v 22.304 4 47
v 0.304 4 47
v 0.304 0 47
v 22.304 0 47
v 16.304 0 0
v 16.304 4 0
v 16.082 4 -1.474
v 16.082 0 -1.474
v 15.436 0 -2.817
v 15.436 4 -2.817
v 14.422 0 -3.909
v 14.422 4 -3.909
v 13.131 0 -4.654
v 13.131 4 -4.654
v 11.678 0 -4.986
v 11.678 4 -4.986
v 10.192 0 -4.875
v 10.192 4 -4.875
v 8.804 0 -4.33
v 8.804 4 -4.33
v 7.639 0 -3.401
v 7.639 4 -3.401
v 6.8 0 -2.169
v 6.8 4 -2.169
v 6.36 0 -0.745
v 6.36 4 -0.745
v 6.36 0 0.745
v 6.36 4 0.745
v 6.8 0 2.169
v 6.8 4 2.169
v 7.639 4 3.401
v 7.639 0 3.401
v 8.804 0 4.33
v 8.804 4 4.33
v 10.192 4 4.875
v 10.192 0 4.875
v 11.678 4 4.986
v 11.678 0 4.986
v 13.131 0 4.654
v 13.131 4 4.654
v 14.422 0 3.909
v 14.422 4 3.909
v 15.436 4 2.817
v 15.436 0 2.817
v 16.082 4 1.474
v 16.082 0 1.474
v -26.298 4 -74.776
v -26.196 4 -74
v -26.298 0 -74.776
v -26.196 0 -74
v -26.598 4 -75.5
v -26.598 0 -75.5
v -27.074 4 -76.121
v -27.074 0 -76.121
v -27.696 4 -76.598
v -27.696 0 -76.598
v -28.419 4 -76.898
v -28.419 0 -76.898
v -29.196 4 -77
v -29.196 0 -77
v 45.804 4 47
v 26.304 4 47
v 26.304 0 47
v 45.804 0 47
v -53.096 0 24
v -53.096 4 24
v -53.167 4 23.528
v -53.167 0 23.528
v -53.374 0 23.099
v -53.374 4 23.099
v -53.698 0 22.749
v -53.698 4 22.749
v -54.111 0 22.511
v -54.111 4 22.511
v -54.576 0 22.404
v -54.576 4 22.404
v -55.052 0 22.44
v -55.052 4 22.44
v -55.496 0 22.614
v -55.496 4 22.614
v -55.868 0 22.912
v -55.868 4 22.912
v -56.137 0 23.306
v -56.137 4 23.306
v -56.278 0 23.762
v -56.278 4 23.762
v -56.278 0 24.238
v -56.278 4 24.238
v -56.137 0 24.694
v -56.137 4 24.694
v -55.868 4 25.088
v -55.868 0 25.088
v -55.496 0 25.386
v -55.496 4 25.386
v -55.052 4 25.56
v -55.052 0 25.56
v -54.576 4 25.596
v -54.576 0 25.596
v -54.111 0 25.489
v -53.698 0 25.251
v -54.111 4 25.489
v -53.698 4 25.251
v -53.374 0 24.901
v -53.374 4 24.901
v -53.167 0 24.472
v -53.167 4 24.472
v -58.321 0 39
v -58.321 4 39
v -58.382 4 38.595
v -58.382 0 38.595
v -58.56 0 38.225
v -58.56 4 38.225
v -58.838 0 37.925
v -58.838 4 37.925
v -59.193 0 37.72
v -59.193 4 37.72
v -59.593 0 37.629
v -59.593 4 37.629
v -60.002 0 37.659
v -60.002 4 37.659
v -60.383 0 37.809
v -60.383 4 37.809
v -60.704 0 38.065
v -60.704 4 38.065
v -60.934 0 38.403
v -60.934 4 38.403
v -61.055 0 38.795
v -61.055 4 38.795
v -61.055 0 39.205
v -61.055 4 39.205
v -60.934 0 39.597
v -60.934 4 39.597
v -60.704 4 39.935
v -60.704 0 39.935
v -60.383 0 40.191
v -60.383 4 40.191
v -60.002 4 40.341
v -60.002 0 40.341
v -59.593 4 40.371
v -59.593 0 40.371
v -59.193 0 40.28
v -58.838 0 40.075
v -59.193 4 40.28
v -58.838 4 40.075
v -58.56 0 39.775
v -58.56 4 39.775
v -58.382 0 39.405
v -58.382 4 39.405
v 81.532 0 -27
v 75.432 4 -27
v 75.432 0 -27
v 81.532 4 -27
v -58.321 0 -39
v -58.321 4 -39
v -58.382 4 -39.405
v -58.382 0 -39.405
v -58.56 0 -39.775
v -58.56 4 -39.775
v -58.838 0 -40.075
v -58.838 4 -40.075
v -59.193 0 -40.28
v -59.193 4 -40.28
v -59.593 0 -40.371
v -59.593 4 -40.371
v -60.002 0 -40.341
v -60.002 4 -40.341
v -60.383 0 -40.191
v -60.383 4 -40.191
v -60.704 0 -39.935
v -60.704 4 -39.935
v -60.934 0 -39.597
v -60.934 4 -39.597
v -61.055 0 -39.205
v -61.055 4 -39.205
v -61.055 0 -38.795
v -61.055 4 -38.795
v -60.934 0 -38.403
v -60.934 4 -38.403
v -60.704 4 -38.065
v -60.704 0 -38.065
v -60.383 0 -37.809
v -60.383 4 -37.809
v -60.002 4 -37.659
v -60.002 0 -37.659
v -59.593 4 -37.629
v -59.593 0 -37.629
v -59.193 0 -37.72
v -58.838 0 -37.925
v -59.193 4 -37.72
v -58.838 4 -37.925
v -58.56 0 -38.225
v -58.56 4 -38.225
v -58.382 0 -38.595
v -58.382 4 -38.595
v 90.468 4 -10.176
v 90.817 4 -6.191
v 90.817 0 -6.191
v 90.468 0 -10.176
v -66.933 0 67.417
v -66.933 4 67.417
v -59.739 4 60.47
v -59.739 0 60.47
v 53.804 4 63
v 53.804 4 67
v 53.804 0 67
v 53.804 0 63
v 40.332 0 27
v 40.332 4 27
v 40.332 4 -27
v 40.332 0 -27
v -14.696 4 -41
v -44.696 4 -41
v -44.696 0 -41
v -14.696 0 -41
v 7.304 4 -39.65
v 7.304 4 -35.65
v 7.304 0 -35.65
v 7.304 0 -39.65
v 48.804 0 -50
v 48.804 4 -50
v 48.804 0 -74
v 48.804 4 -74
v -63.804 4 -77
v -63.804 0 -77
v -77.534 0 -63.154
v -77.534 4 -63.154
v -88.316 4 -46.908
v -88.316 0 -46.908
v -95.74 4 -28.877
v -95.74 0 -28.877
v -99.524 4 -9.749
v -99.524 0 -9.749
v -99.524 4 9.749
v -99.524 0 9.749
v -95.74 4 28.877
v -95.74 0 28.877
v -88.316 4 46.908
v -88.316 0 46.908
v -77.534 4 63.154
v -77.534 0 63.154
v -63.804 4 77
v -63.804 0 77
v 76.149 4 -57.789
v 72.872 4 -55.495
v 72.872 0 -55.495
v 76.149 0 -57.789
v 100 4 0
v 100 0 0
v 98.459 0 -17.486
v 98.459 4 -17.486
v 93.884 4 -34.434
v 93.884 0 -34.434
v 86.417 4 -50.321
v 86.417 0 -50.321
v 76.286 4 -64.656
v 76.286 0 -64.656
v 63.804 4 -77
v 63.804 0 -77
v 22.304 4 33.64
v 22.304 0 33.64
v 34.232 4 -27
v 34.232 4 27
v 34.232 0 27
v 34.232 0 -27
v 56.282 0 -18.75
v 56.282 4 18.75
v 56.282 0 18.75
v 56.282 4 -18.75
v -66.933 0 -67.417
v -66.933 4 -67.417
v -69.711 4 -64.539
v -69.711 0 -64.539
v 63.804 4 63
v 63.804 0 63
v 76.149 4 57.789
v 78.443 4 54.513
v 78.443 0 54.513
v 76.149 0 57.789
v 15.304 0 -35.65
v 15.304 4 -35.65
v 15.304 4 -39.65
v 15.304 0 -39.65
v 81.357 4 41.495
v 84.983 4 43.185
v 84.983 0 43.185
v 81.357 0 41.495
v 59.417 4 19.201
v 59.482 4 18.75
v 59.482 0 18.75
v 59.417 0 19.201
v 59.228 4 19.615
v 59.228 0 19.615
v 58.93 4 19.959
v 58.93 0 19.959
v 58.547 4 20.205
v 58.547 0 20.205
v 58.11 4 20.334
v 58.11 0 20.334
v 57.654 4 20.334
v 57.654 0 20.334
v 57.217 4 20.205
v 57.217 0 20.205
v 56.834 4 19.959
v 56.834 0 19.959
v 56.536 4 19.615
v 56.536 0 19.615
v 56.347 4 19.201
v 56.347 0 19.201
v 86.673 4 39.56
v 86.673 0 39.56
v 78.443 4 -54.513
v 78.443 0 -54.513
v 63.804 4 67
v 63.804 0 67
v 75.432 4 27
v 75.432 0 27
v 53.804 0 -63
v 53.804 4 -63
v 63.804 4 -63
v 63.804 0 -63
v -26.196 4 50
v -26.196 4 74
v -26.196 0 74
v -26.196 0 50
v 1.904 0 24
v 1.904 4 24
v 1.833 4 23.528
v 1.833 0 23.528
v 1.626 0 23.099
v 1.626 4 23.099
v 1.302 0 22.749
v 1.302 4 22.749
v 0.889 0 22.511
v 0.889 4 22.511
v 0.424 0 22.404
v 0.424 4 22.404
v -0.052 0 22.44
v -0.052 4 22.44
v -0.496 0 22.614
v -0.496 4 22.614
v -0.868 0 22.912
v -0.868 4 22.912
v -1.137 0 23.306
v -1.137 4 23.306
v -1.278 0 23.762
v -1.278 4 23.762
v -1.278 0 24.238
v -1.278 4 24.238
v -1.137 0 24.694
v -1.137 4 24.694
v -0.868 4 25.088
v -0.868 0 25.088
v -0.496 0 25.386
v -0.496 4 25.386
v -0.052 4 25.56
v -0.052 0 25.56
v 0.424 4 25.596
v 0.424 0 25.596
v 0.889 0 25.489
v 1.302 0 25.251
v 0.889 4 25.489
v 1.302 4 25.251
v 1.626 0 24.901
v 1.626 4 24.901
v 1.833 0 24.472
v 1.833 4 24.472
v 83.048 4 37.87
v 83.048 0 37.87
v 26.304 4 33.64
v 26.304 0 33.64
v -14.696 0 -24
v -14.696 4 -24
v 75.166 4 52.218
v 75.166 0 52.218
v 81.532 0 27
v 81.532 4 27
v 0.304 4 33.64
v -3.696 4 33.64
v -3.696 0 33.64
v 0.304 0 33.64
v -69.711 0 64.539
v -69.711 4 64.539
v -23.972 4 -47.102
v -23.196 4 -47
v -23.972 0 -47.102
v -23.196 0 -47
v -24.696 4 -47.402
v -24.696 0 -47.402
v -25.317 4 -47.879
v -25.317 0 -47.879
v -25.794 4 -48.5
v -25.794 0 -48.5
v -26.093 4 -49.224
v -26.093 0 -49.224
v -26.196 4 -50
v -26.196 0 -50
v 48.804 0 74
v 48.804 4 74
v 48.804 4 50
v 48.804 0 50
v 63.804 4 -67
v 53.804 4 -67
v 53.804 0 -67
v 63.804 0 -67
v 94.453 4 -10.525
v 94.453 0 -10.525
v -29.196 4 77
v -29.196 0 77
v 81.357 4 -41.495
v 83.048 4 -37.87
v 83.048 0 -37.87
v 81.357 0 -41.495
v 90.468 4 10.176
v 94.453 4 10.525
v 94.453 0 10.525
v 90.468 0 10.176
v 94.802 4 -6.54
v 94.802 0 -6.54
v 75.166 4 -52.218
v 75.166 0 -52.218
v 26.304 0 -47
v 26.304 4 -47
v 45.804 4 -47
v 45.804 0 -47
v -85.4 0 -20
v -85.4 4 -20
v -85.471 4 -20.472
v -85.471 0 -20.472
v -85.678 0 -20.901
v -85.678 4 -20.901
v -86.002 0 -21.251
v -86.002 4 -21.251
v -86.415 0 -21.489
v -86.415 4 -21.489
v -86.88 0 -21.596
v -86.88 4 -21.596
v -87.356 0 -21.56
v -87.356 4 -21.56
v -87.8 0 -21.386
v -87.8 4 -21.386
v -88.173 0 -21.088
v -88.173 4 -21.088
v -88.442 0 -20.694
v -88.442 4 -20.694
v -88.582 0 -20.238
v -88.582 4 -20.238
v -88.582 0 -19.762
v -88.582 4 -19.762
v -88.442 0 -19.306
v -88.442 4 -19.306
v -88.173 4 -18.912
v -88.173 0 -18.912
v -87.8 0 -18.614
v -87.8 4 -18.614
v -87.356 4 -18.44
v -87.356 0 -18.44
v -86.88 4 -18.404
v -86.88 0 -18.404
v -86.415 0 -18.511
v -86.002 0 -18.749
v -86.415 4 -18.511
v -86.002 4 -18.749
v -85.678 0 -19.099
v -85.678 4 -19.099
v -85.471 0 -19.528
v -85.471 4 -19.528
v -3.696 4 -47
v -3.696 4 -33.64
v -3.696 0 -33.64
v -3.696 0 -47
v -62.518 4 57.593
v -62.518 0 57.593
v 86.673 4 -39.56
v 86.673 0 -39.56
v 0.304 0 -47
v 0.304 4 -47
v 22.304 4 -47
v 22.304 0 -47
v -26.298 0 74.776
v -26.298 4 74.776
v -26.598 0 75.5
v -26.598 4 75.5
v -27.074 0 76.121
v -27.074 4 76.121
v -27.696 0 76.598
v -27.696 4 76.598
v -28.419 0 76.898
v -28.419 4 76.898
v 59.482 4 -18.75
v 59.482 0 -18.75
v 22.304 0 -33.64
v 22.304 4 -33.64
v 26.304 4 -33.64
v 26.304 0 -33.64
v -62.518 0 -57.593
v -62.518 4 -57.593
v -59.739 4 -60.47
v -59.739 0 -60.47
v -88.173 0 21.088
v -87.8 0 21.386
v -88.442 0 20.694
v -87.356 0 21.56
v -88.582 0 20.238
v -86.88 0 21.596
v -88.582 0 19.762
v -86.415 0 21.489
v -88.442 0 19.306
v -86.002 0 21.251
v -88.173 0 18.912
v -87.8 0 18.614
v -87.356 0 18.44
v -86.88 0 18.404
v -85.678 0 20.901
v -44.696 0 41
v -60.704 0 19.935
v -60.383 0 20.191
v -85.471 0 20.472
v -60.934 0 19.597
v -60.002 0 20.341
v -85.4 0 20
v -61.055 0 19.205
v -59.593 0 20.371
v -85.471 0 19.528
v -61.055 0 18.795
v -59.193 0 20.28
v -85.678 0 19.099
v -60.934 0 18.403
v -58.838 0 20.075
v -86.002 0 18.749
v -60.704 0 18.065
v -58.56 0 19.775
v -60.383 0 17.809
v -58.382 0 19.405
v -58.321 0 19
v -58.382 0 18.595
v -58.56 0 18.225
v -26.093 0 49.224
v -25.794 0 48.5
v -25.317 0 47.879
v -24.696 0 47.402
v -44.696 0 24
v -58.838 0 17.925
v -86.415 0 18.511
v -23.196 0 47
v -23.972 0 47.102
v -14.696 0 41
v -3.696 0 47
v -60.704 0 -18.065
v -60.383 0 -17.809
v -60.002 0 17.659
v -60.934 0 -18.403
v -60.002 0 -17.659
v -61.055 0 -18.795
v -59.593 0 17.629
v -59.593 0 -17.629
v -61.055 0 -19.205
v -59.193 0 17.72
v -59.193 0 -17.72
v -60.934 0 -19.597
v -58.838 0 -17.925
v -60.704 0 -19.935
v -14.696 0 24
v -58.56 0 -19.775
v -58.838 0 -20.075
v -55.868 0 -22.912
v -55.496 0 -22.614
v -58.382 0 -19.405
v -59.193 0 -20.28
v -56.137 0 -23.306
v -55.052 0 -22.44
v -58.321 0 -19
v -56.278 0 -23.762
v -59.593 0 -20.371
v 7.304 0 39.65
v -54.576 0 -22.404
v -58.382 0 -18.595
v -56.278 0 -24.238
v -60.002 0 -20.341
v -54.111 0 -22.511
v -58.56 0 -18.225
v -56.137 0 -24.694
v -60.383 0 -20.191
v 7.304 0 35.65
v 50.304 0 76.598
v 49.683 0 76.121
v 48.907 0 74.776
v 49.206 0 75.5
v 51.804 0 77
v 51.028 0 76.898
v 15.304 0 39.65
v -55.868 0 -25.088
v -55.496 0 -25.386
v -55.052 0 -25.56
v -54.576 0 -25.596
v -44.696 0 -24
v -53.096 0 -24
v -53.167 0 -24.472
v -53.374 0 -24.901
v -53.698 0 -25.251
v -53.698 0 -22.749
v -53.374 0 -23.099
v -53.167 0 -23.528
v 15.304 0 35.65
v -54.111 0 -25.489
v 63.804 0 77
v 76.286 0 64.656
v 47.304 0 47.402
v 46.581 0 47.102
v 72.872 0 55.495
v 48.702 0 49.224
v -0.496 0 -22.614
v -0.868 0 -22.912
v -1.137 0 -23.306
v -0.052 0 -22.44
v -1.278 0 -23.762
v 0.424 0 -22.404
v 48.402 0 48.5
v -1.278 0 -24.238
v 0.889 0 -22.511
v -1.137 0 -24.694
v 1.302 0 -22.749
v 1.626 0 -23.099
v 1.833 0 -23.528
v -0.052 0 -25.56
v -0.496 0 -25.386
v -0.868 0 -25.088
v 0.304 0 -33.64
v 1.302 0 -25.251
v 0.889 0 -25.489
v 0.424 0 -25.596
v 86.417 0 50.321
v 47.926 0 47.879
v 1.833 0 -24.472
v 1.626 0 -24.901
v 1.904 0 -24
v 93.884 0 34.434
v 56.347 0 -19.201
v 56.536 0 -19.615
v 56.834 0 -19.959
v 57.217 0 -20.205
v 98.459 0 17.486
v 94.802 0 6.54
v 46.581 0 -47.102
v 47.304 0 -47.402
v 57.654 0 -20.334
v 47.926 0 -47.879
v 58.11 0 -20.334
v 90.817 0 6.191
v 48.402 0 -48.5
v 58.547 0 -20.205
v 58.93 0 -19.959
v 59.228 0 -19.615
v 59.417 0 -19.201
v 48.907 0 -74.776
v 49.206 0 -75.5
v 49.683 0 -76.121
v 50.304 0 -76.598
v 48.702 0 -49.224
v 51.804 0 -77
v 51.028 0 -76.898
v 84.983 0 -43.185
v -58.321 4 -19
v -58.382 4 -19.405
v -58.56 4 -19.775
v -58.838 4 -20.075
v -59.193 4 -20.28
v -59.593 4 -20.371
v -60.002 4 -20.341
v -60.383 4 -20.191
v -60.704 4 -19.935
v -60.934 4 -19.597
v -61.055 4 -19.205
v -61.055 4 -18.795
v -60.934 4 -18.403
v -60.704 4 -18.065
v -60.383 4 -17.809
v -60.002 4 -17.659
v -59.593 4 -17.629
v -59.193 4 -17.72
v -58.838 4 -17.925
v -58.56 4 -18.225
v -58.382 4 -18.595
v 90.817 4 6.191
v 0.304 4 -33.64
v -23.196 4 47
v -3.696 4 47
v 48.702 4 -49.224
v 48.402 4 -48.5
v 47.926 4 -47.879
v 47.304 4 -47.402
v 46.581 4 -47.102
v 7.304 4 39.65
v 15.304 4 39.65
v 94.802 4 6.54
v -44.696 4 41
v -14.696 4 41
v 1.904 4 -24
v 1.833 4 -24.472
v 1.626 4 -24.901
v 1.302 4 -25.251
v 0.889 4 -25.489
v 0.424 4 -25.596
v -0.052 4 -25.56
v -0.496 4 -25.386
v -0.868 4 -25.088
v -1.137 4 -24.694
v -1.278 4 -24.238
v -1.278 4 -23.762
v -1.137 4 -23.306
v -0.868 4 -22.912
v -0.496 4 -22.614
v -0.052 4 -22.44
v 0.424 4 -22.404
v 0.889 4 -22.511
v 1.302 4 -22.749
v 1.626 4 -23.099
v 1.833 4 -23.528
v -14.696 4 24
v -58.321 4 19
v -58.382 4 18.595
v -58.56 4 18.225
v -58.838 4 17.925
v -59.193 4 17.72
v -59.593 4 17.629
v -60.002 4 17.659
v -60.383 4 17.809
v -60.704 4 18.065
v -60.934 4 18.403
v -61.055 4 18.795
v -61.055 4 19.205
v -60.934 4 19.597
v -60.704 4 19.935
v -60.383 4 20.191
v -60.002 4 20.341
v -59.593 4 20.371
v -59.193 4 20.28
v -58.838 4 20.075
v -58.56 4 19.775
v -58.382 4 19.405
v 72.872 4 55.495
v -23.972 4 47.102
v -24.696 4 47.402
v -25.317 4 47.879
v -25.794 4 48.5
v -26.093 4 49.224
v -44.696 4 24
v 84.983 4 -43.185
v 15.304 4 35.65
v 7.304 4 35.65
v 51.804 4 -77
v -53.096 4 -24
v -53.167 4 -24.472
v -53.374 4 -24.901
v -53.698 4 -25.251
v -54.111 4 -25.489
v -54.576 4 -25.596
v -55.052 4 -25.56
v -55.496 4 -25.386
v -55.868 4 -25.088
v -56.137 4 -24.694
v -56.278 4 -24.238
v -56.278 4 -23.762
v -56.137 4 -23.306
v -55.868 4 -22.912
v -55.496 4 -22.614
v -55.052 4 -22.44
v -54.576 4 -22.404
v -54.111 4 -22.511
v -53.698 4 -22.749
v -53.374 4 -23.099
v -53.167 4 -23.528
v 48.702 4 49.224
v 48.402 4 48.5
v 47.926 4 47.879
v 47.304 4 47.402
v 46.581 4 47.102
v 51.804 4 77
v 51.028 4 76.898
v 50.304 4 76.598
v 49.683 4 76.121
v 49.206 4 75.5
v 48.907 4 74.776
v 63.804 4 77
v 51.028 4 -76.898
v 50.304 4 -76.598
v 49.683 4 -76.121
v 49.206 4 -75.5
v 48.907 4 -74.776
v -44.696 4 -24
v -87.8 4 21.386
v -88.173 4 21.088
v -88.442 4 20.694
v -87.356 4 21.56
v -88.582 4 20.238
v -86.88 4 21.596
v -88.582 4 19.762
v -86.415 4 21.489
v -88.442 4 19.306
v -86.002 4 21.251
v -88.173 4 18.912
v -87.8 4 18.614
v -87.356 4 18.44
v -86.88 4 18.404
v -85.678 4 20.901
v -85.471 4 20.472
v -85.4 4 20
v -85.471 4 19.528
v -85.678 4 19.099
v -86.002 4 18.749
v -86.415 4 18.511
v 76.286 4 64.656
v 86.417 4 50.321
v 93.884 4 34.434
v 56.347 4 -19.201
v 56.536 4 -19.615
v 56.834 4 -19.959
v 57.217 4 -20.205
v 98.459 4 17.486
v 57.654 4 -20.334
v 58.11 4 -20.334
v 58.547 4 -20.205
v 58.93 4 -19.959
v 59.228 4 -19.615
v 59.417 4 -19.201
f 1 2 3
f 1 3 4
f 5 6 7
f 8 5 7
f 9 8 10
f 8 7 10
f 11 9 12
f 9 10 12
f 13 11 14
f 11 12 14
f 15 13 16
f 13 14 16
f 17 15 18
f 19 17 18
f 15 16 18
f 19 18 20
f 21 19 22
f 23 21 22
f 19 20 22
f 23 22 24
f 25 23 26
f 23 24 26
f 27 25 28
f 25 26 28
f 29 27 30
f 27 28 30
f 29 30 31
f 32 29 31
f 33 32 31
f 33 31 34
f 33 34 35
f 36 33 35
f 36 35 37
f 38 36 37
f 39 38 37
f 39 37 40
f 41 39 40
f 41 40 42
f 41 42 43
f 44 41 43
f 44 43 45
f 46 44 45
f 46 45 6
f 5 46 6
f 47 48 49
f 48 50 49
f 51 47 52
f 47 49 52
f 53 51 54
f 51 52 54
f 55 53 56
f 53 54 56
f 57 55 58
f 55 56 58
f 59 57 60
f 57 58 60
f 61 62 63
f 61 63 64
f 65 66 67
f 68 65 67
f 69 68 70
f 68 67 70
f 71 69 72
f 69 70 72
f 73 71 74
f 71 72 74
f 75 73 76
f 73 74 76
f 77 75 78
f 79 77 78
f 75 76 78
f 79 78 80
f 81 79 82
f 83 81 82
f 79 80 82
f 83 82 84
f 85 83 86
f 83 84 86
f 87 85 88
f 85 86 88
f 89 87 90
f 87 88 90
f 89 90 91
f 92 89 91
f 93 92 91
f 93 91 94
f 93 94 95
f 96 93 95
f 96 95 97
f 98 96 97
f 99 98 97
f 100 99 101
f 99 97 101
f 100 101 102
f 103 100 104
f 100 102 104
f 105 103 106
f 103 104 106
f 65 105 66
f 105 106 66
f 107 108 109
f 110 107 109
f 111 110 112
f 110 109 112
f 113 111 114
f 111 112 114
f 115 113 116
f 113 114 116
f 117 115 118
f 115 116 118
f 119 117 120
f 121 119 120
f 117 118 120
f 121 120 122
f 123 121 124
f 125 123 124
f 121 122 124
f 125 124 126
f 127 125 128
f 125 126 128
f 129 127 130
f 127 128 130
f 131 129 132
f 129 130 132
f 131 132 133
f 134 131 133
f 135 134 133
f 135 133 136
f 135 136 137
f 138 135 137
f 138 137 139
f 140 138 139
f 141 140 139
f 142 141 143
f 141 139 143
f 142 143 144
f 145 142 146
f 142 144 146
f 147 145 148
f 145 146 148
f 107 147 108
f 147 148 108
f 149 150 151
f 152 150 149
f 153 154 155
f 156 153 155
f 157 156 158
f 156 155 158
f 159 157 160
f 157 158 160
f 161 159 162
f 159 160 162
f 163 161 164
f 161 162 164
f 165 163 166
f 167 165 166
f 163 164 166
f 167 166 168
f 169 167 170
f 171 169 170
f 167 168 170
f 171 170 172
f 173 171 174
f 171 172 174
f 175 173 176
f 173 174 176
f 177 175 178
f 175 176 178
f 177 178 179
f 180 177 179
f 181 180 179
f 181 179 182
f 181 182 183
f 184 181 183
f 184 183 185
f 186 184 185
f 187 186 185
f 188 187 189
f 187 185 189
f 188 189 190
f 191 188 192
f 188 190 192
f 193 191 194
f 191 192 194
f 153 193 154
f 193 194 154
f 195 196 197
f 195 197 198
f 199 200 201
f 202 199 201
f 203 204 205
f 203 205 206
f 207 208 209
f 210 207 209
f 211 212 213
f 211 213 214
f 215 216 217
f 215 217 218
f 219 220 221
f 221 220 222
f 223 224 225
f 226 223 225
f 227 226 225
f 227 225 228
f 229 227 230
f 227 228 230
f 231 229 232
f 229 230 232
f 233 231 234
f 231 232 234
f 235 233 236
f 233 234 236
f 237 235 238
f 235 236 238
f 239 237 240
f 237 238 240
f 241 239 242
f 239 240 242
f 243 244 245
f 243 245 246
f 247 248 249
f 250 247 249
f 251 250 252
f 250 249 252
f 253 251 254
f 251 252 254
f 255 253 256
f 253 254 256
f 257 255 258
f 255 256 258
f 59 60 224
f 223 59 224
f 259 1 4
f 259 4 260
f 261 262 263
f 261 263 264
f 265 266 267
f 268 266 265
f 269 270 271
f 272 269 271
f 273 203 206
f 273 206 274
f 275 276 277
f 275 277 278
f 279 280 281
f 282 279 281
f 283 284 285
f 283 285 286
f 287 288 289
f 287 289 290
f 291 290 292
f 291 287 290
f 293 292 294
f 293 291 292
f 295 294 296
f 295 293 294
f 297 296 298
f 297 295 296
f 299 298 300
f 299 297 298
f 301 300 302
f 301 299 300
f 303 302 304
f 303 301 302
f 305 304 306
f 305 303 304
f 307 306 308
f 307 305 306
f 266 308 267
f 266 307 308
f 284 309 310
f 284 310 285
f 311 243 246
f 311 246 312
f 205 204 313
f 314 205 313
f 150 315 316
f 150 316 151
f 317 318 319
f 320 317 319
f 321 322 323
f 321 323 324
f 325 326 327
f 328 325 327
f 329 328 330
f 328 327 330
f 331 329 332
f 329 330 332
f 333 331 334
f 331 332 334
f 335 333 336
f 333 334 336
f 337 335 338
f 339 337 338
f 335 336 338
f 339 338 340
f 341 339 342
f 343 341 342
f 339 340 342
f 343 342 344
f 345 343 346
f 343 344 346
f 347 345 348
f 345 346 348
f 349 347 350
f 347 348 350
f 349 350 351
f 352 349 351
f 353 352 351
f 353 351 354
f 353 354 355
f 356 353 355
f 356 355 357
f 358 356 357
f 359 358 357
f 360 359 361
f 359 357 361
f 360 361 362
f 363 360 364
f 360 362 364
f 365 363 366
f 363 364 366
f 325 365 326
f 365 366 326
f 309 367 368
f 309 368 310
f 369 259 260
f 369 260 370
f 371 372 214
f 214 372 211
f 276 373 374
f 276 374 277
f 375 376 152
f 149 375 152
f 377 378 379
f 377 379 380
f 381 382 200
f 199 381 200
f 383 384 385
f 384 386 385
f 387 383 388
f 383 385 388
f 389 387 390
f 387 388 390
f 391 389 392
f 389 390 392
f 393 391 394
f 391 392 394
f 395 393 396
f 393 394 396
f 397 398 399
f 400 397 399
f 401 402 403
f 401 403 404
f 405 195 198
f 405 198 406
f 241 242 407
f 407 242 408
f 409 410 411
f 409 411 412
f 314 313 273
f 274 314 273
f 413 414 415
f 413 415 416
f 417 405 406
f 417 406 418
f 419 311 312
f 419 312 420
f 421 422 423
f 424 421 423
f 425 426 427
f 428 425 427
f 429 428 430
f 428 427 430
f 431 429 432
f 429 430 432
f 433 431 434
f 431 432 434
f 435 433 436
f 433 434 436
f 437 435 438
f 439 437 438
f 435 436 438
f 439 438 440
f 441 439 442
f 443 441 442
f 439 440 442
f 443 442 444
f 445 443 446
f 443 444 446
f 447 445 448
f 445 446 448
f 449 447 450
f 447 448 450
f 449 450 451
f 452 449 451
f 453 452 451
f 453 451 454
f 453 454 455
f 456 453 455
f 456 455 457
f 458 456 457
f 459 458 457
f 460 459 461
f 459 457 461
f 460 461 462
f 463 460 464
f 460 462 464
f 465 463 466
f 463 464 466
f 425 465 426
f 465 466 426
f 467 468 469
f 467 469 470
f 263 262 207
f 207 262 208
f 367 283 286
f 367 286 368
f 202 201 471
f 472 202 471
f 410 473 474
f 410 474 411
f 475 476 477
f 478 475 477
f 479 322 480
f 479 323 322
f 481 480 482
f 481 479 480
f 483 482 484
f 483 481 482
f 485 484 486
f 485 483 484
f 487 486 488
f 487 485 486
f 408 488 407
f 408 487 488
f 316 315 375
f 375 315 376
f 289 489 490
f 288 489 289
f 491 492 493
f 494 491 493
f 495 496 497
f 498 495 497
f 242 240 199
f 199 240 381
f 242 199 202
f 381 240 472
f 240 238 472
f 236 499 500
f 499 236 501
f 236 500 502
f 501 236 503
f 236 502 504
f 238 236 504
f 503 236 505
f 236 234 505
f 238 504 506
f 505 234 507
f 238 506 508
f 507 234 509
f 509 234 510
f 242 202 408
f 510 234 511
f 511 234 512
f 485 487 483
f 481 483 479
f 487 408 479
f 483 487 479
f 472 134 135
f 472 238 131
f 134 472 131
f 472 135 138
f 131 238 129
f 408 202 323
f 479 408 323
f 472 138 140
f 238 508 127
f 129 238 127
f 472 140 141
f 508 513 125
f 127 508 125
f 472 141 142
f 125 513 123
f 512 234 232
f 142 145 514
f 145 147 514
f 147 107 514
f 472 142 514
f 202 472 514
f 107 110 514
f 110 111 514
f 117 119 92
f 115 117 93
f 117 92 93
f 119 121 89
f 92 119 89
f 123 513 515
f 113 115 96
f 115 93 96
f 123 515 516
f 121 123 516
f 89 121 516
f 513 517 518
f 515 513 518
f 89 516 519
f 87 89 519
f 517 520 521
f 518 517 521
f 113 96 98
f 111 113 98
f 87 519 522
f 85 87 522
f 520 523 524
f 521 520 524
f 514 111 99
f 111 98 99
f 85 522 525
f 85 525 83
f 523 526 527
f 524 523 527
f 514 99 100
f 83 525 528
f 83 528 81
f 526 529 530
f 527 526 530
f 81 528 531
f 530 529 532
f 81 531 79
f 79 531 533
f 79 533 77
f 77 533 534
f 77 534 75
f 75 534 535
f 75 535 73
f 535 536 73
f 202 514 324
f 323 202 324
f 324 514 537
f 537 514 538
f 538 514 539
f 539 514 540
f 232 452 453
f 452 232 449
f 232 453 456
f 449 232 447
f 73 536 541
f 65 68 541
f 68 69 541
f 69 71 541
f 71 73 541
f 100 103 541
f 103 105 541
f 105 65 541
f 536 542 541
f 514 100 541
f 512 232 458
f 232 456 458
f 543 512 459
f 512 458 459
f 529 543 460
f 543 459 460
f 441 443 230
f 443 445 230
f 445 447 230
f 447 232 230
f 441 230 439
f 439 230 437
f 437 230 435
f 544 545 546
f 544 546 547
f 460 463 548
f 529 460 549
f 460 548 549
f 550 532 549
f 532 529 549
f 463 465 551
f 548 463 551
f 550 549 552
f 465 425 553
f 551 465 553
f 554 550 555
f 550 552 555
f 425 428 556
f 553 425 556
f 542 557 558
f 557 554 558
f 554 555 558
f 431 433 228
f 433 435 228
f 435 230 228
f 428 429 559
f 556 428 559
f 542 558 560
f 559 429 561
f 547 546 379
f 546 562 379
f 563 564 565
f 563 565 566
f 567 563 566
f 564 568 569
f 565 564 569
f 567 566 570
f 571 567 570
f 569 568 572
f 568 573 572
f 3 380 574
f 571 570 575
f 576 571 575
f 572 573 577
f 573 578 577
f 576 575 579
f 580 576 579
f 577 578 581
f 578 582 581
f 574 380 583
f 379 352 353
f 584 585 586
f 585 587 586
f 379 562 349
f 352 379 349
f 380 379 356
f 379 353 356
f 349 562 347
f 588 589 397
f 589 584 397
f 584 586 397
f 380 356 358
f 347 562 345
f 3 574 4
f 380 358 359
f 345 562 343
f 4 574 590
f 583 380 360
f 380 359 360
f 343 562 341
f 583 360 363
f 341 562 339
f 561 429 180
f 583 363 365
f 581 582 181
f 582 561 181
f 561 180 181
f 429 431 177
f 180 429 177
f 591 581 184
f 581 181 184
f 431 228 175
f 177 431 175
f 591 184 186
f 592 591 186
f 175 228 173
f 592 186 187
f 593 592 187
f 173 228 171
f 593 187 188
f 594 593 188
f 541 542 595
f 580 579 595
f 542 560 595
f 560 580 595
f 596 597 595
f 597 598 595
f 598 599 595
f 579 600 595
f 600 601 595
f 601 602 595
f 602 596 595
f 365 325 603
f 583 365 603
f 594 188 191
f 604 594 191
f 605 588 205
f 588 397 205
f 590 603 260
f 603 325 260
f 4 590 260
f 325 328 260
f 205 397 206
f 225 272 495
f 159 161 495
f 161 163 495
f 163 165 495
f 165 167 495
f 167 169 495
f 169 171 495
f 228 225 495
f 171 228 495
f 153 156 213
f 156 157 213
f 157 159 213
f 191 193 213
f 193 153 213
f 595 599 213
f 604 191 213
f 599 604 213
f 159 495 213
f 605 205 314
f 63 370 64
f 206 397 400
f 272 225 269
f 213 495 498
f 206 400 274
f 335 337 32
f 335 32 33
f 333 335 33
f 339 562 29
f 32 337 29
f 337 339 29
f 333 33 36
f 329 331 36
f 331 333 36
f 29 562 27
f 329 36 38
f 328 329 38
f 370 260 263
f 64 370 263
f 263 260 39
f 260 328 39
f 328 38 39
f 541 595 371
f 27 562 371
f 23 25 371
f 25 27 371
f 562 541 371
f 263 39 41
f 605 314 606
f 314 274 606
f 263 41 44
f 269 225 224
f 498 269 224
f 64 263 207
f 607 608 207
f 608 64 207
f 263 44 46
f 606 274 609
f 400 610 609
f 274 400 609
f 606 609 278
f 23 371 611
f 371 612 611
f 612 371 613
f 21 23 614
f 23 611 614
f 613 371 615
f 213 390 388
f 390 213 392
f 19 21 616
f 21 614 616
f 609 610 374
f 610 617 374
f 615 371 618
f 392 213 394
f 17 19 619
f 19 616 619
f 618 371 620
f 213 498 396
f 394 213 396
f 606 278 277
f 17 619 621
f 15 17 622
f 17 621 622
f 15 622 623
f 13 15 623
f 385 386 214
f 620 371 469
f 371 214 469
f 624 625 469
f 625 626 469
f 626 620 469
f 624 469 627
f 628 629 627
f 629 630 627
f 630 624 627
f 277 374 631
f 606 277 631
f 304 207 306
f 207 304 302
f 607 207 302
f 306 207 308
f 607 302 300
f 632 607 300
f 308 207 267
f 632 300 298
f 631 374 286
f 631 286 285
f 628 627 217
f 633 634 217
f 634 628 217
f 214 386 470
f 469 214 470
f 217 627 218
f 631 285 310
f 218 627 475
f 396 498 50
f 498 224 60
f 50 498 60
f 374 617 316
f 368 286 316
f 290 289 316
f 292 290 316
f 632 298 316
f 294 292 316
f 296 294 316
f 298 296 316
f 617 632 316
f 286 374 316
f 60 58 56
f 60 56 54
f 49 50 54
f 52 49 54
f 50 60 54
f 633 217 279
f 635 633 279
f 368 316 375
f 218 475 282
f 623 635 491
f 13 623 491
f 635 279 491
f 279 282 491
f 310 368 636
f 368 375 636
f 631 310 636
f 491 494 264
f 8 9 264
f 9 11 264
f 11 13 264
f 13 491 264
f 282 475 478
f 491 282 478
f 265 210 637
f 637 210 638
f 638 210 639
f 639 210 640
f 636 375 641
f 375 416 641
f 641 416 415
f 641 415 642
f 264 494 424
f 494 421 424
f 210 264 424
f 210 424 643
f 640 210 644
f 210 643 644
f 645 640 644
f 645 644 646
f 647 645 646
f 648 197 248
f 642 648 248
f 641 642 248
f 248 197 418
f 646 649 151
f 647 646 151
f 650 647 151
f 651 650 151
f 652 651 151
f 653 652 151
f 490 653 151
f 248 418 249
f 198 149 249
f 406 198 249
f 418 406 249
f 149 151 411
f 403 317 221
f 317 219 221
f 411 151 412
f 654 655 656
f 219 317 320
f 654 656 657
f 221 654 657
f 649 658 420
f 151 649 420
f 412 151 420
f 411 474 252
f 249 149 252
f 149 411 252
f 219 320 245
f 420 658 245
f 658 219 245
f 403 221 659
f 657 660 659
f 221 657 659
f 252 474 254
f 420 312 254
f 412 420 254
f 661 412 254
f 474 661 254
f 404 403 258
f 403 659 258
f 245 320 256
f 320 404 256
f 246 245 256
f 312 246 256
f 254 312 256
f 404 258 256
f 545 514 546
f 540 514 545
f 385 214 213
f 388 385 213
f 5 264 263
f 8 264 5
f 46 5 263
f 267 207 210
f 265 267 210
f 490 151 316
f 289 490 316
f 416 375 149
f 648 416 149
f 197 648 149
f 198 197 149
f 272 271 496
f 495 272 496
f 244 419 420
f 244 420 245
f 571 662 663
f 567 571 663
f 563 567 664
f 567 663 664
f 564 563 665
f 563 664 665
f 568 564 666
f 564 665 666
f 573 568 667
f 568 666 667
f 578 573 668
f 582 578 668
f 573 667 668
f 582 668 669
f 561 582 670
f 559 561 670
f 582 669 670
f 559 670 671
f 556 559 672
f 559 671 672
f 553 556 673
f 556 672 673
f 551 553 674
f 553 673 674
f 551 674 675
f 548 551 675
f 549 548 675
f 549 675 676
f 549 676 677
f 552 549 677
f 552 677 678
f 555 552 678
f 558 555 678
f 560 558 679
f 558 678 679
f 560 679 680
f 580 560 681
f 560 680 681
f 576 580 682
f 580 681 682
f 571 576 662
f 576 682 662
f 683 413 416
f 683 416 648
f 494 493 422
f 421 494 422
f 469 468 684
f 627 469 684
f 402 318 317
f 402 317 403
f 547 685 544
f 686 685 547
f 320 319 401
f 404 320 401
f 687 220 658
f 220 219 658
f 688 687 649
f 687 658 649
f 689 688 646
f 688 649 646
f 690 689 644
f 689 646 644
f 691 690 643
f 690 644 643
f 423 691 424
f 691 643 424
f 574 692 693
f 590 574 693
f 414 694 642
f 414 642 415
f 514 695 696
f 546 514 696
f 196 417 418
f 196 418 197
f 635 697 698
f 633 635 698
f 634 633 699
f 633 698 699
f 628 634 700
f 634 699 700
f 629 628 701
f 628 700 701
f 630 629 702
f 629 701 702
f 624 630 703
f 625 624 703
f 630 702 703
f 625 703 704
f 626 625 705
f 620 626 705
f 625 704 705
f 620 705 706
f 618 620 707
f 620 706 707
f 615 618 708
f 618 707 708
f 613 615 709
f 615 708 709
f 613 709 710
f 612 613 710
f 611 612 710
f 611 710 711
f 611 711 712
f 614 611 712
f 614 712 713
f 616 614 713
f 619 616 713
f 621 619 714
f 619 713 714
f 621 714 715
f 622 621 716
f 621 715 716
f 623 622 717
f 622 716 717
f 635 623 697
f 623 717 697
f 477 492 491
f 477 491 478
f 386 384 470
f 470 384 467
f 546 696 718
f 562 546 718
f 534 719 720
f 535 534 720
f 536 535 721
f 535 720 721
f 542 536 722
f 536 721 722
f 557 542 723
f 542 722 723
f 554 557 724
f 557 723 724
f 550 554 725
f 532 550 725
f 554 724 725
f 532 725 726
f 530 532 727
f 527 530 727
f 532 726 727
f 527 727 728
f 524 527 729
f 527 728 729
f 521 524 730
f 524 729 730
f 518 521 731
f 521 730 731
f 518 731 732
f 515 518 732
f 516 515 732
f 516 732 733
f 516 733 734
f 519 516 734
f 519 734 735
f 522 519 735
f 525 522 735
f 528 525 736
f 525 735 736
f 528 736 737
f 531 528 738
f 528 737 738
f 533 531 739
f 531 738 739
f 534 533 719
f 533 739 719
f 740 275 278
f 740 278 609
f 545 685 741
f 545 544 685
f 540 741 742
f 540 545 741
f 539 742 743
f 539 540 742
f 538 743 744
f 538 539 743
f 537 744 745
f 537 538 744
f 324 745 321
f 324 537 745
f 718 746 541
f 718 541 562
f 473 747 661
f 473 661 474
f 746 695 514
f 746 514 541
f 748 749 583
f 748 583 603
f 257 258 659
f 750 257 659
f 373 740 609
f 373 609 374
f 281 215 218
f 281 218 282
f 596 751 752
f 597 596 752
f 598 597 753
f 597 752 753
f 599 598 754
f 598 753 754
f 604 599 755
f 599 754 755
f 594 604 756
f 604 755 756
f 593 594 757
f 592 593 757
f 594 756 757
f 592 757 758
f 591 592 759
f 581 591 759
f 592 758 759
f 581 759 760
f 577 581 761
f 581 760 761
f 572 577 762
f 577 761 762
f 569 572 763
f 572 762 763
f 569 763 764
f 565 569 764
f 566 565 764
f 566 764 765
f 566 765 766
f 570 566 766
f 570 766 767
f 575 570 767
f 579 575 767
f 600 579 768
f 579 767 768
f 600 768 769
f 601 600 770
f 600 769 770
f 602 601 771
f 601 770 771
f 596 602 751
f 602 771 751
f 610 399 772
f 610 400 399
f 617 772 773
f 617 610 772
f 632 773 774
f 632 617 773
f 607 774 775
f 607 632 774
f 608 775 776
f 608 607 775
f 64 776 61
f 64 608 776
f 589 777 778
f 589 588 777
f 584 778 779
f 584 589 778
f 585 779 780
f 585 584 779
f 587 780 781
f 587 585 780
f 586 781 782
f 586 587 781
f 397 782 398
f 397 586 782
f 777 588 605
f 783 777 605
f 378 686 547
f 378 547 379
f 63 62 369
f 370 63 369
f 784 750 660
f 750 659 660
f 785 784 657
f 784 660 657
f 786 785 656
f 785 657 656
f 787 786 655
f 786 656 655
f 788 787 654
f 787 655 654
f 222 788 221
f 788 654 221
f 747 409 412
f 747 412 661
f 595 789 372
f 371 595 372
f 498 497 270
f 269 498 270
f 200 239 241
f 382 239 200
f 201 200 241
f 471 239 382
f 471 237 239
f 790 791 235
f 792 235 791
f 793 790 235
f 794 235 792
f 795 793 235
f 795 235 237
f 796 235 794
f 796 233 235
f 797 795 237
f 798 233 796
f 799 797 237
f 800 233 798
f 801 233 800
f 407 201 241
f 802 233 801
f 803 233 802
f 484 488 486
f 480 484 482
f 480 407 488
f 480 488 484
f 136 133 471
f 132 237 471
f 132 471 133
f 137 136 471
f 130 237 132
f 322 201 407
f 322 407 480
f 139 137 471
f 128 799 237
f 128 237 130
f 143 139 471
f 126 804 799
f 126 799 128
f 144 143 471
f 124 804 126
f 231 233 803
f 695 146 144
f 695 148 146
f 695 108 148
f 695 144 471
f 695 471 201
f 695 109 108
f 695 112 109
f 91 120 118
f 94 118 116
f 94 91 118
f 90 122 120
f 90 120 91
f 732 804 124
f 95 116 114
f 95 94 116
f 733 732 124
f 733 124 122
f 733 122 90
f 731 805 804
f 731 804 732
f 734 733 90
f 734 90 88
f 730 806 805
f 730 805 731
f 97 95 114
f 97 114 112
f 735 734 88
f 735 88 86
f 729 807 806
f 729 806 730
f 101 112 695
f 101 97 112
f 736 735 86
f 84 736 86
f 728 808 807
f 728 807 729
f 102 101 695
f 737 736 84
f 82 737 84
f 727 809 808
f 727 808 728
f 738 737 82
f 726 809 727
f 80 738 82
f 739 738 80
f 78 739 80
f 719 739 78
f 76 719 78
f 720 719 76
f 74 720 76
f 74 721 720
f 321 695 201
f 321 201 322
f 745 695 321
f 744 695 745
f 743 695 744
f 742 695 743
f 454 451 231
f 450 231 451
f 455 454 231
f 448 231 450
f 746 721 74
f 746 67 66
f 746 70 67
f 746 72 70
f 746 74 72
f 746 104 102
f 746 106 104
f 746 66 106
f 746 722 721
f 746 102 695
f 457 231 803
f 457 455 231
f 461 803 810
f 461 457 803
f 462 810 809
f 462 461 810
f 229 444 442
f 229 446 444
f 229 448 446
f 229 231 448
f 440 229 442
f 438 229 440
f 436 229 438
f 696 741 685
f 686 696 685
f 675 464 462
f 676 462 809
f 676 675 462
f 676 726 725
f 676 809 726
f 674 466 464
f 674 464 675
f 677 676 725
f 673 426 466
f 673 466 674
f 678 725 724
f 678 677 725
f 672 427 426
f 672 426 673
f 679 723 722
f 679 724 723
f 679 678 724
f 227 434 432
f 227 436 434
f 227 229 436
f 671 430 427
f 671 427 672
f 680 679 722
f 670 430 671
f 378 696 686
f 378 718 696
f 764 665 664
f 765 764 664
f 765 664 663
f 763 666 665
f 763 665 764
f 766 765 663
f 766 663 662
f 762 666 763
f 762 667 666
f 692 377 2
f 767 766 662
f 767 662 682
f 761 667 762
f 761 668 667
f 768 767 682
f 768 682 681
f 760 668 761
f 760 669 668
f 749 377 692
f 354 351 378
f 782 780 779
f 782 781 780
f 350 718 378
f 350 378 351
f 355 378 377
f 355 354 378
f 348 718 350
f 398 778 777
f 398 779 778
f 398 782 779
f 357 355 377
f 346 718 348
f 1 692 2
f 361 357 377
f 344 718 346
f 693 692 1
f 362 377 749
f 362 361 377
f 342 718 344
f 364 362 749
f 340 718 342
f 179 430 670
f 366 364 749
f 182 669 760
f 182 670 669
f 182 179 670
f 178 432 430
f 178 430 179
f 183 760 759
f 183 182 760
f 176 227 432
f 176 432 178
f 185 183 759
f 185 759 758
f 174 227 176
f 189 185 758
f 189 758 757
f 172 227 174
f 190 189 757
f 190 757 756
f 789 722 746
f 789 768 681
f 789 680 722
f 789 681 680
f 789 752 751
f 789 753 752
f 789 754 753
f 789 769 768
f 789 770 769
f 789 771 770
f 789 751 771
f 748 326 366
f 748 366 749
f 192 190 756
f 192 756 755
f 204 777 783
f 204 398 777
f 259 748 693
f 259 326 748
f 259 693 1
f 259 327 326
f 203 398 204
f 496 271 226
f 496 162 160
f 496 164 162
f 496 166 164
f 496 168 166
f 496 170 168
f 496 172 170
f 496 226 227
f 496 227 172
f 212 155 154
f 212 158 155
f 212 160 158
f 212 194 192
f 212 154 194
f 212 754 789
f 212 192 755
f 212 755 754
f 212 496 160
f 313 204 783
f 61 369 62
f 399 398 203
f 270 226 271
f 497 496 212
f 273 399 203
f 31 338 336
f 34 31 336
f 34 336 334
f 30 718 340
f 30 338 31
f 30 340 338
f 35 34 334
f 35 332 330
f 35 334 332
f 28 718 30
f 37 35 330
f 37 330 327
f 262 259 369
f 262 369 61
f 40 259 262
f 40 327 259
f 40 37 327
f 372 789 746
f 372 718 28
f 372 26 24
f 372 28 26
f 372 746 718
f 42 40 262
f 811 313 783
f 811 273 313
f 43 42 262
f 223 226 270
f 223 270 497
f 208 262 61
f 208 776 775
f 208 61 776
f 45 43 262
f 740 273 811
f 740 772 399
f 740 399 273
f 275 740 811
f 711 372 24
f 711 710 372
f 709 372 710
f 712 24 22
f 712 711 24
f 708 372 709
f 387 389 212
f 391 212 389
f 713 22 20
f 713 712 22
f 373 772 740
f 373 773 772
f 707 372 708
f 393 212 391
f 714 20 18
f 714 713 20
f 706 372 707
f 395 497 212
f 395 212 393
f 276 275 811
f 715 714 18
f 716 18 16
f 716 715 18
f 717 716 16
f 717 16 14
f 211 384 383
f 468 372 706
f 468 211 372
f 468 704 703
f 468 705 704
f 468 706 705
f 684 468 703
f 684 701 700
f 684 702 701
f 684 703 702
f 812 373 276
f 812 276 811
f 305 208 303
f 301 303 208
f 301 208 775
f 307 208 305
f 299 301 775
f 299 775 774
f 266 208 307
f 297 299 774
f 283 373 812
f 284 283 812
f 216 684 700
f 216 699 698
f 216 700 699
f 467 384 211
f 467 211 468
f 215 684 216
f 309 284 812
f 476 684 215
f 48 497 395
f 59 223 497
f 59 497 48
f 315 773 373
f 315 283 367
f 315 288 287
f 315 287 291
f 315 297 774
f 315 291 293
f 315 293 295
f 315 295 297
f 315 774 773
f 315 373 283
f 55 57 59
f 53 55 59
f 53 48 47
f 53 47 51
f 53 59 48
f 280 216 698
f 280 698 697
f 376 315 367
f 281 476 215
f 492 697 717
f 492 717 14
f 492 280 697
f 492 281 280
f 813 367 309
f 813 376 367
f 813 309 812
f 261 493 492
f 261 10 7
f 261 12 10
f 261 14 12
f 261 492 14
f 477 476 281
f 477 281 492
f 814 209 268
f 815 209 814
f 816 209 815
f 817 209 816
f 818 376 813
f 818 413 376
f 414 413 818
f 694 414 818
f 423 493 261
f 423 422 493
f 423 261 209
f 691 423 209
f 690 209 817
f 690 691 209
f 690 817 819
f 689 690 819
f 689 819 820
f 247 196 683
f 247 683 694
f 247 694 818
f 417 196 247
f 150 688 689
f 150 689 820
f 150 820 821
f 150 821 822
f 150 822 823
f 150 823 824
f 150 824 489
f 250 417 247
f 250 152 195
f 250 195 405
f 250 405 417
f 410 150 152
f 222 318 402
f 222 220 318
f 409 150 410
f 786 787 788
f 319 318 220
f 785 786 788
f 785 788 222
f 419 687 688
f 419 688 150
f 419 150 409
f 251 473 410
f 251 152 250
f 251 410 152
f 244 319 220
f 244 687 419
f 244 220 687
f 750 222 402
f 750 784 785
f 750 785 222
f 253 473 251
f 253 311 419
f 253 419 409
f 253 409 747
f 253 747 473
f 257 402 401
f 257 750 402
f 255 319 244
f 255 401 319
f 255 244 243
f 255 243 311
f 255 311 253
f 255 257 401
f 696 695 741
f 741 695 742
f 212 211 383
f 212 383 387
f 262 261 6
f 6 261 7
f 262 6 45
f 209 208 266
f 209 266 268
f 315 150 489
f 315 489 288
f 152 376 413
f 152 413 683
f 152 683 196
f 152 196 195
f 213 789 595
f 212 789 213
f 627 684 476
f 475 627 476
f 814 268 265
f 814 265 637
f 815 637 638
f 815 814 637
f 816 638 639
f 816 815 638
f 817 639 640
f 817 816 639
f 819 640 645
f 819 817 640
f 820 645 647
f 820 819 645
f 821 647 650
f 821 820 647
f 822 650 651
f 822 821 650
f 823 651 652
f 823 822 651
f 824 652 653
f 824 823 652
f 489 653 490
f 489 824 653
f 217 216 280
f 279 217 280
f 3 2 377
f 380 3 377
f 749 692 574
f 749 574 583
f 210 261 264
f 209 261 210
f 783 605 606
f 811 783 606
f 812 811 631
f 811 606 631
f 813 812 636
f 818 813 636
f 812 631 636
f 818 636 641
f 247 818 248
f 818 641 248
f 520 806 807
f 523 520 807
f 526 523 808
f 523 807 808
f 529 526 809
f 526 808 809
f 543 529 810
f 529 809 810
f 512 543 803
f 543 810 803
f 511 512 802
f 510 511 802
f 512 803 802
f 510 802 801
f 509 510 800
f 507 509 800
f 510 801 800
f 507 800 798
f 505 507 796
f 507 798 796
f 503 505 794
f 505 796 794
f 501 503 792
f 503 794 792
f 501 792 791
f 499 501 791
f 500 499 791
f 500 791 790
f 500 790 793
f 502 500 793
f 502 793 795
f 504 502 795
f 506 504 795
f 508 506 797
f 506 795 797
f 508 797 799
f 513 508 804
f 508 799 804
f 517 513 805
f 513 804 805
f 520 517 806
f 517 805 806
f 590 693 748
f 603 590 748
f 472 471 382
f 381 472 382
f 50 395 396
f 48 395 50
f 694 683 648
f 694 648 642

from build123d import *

# Parameters (mm, degrees)
BASIS_DEPTH        = 4
MODU_BRACKET_DEPTH = 4
SKETCH3_R          = 5
SKETCH3_W          = 75
SKETCH3_H          = 30
SKETCH3_W_2        = 8
SKETCH3_H_2        = 4
CUT_EXTRUDE2_DEPTH = 5
SKETCH4_W          = 6.1
SKETCH4_H          = 54
CUT_EXTRUDE3_DEPTH = 4
SKETCH5_W          = 4
SKETCH5_H          = 14
CUT_EXTRUDE4_DEPTH = 4
SKETCH6_W          = 10
SKETCH6_H          = 4
CUT_EXTRUDE5_DEPTH = 4
SKETCH9_R          = 1.6
SKETCH9_R_2        = 1.375
CUT_EXTRUDE7_DEPTH = 4
SKETCH10_W         = 30
SKETCH10_H         = 17
CUT_EXTRUDE8_DEPTH = 4
SKETCH11_R         = 1.6
CUT_EXTRUDE9_DEPTH = 4
FILLET1_R          = 3


with BuildPart() as part:
    # Sketch1 → Basis (new body)
    with BuildSketch(Plane(origin=(0, 0, 0), x_dir=(1, 0, 0), z_dir=(0, 1, 0))):
        with BuildLine():
            Line((63.804388564, 77), (-63.804388564, 77))
            ThreePointArc((-63.804388564, 77), (-100, 0), (-63.804388564, -77))
            Line((-63.804388564, -77), (63.804388564, -77))
            ThreePointArc((63.804388564, -77), (90.499831095, -42.541515862), (100, 0))
            ThreePointArc((100, 0), (90.499831095, 42.541515862), (63.804388564, 77))
        make_face()
    extrude(amount=BASIS_DEPTH)

    # Sketch2 → Modu bracket (cut)
    with BuildSketch(Plane(origin=(0, 4, 0), x_dir=(1, 0, 0), z_dir=(0, 1, 0))):
        Polygon((90.817009036, -6.191182133), (94.801787829, -6.539805104), (94.453164858, -10.524583897), (90.468386065, -10.175960926), align=None)
        Polygon((83.047916894, -37.86952889), (86.673148042, -39.560001937), (84.982674995, -43.185233085), (81.357443847, -41.494760038), align=None)
        Polygon((75.166261713, -52.218202052), (78.442869891, -54.512507797), (76.148564145, -57.789115975), (72.871955968, -55.494810229), align=None)
        Polygon((90.468386065, 10.175960926), (94.453164858, 10.524583897), (94.801787829, 6.539805104), (90.817009036, 6.191182133), align=None)
        Polygon((81.357443847, 41.494760038), (84.982674995, 43.185233085), (86.673148042, 39.560001937), (83.047916894, 37.86952889), align=None)
        Polygon((72.871955968, 55.494810229), (76.148564145, 57.789115975), (78.44286989, 54.512507797), (75.166261713, 52.218202052), align=None)
    extrude(amount=-MODU_BRACKET_DEPTH, mode=Mode.SUBTRACT)

    # Sketch3 → Cut-Extrude2 (cut, through all)
    with BuildSketch(Plane(origin=(0, 4, 0), x_dir=(1, 0, 0), z_dir=(0, 1, 0))):
        with Locations((11.304388564, 0)):
            Circle(SKETCH3_R)
        with Locations((11.304388564, -62)):
            Rectangle(SKETCH3_W, SKETCH3_H)
        with Locations((11.304388564, 62)):
            Rectangle(SKETCH3_W, SKETCH3_H)
        with Locations((11.304388564, -37.65)):
            Rectangle(SKETCH3_W_2, SKETCH3_H_2)
        with Locations((11.304388564, 37.65)):
            Rectangle(SKETCH3_W_2, SKETCH3_H_2)
    extrude(amount=-CUT_EXTRUDE2_DEPTH, mode=Mode.SUBTRACT)

    # Sketch4 → Cut-Extrude3 (cut)
    with BuildSketch(Plane(origin=(0, 4, 0), x_dir=(1, 0, 0), z_dir=(0, 1, 0))):
        with BuildLine():
            Line((56.282145861, -18.75), (56.282145861, 18.75))
            ThreePointArc((56.282145861, 18.75), (57.882145861, 20.35), (59.482145861, 18.75))
            Line((59.482145861, 18.75), (59.482145861, -18.75))
            ThreePointArc((59.482145861, -18.75), (57.882145861, -20.35), (56.282145861, -18.75))
        make_face()
        with Locations((78.482145861, 0)):
            Rectangle(SKETCH4_W, SKETCH4_H)
        with Locations((37.282145861, 0)):
            Rectangle(SKETCH4_W, SKETCH4_H)
    extrude(amount=-CUT_EXTRUDE3_DEPTH, mode=Mode.SUBTRACT)

    # Sketch5 → Cut-Extrude4 (cut)
    with BuildSketch(Plane(origin=(0, 4, 0), x_dir=(1, 0, 0), z_dir=(0, 1, 0))):
        with Locations((-1.695611436, -40.64)):
            Rectangle(SKETCH5_W, SKETCH5_H)
        with Locations((-1.695611436, 40.64)):
            Rectangle(SKETCH5_W, SKETCH5_H)
        with Locations((24.304388564, 40.64)):
            Rectangle(SKETCH5_W, SKETCH5_H)
        with Locations((24.304388564, -40.64)):
            Rectangle(SKETCH5_W, SKETCH5_H)
    extrude(amount=-CUT_EXTRUDE4_DEPTH, mode=Mode.SUBTRACT)

    # Sketch6 → Cut-Extrude5 (cut)
    with BuildSketch(Plane(origin=(0, 4, 0), x_dir=(1, 0, 0), z_dir=(0, 1, 0))):
        Polygon((-62.518054096, 57.592655881), (-59.739420614, 60.470015082), (-66.932818617, 67.416598787), (-69.711452099, 64.539239585), align=None)
        Polygon((-59.739420614, -60.470015082), (-62.518054096, -57.592655881), (-69.711452099, -64.539239585), (-66.932818617, -67.416598787), align=None)
        with Locations((58.804388564, -65)):
            Rectangle(SKETCH6_W, SKETCH6_H)
        with Locations((58.804388564, 65)):
            Rectangle(SKETCH6_W, SKETCH6_H)
    extrude(amount=-CUT_EXTRUDE5_DEPTH, mode=Mode.SUBTRACT)

    # Sketch9 → Cut-Extrude7 (cut)
    with BuildSketch(Plane(origin=(0, 4, 0), x_dir=(1, 0, 0), z_dir=(0, 1, 0))):
        with Locations((-54.695611436, -24)):
            Circle(SKETCH9_R)
        with Locations((-54.695611436, 24)):
            Circle(SKETCH9_R)
        with Locations((0.304388564, 24)):
            Circle(SKETCH9_R)
        with Locations((0.304388564, -24)):
            Circle(SKETCH9_R)
        with Locations((-59.695611436, 39)):
            Circle(SKETCH9_R_2)
        with Locations((-59.695611436, -19)):
            Circle(SKETCH9_R_2)
        with Locations((-59.695611436, 19)):
            Circle(SKETCH9_R_2)
        with Locations((-59.695611436, -39)):
            Circle(SKETCH9_R_2)
    extrude(amount=-CUT_EXTRUDE7_DEPTH, mode=Mode.SUBTRACT)

    # Sketch10 → Cut-Extrude8 (cut)
    with BuildSketch(Plane(origin=(0, 4, 0), x_dir=(1, 0, 0), z_dir=(0, 1, 0))):
        with Locations((-29.695611436, 32.5)):
            Rectangle(SKETCH10_W, SKETCH10_H)
        with Locations((-29.695611436, -32.5)):
            Rectangle(SKETCH10_W, SKETCH10_H)
    extrude(amount=-CUT_EXTRUDE8_DEPTH, mode=Mode.SUBTRACT)

    # Sketch11 → Cut-Extrude9 (cut)
    with BuildSketch(Plane(origin=(0, 4, 0), x_dir=(1, 0, 0), z_dir=(0, 1, 0))):
        with Locations((-87, -20)):
            Circle(SKETCH11_R)
        with Locations((-87, 20)):
            Circle(SKETCH11_R)
    extrude(amount=-CUT_EXTRUDE9_DEPTH, mode=Mode.SUBTRACT)

    # Fillet1
    fillet1_edges = [part.edges().sort_by_distance(p)[0] for p in [
        (48.804388564, 2, 77),
        (-26.195611436, 2, 77),
        (-26.195611436, 2, 47),
        (48.804388564, 2, 47),
        (48.804388564, 2, -77),
        (48.804388564, 2, -47),
        (-26.195611436, 2, -47),
        (-26.195611436, 2, -77),
    ]]
    fillet(fillet1_edges, radius=FILLET1_R)


solid = part.part
